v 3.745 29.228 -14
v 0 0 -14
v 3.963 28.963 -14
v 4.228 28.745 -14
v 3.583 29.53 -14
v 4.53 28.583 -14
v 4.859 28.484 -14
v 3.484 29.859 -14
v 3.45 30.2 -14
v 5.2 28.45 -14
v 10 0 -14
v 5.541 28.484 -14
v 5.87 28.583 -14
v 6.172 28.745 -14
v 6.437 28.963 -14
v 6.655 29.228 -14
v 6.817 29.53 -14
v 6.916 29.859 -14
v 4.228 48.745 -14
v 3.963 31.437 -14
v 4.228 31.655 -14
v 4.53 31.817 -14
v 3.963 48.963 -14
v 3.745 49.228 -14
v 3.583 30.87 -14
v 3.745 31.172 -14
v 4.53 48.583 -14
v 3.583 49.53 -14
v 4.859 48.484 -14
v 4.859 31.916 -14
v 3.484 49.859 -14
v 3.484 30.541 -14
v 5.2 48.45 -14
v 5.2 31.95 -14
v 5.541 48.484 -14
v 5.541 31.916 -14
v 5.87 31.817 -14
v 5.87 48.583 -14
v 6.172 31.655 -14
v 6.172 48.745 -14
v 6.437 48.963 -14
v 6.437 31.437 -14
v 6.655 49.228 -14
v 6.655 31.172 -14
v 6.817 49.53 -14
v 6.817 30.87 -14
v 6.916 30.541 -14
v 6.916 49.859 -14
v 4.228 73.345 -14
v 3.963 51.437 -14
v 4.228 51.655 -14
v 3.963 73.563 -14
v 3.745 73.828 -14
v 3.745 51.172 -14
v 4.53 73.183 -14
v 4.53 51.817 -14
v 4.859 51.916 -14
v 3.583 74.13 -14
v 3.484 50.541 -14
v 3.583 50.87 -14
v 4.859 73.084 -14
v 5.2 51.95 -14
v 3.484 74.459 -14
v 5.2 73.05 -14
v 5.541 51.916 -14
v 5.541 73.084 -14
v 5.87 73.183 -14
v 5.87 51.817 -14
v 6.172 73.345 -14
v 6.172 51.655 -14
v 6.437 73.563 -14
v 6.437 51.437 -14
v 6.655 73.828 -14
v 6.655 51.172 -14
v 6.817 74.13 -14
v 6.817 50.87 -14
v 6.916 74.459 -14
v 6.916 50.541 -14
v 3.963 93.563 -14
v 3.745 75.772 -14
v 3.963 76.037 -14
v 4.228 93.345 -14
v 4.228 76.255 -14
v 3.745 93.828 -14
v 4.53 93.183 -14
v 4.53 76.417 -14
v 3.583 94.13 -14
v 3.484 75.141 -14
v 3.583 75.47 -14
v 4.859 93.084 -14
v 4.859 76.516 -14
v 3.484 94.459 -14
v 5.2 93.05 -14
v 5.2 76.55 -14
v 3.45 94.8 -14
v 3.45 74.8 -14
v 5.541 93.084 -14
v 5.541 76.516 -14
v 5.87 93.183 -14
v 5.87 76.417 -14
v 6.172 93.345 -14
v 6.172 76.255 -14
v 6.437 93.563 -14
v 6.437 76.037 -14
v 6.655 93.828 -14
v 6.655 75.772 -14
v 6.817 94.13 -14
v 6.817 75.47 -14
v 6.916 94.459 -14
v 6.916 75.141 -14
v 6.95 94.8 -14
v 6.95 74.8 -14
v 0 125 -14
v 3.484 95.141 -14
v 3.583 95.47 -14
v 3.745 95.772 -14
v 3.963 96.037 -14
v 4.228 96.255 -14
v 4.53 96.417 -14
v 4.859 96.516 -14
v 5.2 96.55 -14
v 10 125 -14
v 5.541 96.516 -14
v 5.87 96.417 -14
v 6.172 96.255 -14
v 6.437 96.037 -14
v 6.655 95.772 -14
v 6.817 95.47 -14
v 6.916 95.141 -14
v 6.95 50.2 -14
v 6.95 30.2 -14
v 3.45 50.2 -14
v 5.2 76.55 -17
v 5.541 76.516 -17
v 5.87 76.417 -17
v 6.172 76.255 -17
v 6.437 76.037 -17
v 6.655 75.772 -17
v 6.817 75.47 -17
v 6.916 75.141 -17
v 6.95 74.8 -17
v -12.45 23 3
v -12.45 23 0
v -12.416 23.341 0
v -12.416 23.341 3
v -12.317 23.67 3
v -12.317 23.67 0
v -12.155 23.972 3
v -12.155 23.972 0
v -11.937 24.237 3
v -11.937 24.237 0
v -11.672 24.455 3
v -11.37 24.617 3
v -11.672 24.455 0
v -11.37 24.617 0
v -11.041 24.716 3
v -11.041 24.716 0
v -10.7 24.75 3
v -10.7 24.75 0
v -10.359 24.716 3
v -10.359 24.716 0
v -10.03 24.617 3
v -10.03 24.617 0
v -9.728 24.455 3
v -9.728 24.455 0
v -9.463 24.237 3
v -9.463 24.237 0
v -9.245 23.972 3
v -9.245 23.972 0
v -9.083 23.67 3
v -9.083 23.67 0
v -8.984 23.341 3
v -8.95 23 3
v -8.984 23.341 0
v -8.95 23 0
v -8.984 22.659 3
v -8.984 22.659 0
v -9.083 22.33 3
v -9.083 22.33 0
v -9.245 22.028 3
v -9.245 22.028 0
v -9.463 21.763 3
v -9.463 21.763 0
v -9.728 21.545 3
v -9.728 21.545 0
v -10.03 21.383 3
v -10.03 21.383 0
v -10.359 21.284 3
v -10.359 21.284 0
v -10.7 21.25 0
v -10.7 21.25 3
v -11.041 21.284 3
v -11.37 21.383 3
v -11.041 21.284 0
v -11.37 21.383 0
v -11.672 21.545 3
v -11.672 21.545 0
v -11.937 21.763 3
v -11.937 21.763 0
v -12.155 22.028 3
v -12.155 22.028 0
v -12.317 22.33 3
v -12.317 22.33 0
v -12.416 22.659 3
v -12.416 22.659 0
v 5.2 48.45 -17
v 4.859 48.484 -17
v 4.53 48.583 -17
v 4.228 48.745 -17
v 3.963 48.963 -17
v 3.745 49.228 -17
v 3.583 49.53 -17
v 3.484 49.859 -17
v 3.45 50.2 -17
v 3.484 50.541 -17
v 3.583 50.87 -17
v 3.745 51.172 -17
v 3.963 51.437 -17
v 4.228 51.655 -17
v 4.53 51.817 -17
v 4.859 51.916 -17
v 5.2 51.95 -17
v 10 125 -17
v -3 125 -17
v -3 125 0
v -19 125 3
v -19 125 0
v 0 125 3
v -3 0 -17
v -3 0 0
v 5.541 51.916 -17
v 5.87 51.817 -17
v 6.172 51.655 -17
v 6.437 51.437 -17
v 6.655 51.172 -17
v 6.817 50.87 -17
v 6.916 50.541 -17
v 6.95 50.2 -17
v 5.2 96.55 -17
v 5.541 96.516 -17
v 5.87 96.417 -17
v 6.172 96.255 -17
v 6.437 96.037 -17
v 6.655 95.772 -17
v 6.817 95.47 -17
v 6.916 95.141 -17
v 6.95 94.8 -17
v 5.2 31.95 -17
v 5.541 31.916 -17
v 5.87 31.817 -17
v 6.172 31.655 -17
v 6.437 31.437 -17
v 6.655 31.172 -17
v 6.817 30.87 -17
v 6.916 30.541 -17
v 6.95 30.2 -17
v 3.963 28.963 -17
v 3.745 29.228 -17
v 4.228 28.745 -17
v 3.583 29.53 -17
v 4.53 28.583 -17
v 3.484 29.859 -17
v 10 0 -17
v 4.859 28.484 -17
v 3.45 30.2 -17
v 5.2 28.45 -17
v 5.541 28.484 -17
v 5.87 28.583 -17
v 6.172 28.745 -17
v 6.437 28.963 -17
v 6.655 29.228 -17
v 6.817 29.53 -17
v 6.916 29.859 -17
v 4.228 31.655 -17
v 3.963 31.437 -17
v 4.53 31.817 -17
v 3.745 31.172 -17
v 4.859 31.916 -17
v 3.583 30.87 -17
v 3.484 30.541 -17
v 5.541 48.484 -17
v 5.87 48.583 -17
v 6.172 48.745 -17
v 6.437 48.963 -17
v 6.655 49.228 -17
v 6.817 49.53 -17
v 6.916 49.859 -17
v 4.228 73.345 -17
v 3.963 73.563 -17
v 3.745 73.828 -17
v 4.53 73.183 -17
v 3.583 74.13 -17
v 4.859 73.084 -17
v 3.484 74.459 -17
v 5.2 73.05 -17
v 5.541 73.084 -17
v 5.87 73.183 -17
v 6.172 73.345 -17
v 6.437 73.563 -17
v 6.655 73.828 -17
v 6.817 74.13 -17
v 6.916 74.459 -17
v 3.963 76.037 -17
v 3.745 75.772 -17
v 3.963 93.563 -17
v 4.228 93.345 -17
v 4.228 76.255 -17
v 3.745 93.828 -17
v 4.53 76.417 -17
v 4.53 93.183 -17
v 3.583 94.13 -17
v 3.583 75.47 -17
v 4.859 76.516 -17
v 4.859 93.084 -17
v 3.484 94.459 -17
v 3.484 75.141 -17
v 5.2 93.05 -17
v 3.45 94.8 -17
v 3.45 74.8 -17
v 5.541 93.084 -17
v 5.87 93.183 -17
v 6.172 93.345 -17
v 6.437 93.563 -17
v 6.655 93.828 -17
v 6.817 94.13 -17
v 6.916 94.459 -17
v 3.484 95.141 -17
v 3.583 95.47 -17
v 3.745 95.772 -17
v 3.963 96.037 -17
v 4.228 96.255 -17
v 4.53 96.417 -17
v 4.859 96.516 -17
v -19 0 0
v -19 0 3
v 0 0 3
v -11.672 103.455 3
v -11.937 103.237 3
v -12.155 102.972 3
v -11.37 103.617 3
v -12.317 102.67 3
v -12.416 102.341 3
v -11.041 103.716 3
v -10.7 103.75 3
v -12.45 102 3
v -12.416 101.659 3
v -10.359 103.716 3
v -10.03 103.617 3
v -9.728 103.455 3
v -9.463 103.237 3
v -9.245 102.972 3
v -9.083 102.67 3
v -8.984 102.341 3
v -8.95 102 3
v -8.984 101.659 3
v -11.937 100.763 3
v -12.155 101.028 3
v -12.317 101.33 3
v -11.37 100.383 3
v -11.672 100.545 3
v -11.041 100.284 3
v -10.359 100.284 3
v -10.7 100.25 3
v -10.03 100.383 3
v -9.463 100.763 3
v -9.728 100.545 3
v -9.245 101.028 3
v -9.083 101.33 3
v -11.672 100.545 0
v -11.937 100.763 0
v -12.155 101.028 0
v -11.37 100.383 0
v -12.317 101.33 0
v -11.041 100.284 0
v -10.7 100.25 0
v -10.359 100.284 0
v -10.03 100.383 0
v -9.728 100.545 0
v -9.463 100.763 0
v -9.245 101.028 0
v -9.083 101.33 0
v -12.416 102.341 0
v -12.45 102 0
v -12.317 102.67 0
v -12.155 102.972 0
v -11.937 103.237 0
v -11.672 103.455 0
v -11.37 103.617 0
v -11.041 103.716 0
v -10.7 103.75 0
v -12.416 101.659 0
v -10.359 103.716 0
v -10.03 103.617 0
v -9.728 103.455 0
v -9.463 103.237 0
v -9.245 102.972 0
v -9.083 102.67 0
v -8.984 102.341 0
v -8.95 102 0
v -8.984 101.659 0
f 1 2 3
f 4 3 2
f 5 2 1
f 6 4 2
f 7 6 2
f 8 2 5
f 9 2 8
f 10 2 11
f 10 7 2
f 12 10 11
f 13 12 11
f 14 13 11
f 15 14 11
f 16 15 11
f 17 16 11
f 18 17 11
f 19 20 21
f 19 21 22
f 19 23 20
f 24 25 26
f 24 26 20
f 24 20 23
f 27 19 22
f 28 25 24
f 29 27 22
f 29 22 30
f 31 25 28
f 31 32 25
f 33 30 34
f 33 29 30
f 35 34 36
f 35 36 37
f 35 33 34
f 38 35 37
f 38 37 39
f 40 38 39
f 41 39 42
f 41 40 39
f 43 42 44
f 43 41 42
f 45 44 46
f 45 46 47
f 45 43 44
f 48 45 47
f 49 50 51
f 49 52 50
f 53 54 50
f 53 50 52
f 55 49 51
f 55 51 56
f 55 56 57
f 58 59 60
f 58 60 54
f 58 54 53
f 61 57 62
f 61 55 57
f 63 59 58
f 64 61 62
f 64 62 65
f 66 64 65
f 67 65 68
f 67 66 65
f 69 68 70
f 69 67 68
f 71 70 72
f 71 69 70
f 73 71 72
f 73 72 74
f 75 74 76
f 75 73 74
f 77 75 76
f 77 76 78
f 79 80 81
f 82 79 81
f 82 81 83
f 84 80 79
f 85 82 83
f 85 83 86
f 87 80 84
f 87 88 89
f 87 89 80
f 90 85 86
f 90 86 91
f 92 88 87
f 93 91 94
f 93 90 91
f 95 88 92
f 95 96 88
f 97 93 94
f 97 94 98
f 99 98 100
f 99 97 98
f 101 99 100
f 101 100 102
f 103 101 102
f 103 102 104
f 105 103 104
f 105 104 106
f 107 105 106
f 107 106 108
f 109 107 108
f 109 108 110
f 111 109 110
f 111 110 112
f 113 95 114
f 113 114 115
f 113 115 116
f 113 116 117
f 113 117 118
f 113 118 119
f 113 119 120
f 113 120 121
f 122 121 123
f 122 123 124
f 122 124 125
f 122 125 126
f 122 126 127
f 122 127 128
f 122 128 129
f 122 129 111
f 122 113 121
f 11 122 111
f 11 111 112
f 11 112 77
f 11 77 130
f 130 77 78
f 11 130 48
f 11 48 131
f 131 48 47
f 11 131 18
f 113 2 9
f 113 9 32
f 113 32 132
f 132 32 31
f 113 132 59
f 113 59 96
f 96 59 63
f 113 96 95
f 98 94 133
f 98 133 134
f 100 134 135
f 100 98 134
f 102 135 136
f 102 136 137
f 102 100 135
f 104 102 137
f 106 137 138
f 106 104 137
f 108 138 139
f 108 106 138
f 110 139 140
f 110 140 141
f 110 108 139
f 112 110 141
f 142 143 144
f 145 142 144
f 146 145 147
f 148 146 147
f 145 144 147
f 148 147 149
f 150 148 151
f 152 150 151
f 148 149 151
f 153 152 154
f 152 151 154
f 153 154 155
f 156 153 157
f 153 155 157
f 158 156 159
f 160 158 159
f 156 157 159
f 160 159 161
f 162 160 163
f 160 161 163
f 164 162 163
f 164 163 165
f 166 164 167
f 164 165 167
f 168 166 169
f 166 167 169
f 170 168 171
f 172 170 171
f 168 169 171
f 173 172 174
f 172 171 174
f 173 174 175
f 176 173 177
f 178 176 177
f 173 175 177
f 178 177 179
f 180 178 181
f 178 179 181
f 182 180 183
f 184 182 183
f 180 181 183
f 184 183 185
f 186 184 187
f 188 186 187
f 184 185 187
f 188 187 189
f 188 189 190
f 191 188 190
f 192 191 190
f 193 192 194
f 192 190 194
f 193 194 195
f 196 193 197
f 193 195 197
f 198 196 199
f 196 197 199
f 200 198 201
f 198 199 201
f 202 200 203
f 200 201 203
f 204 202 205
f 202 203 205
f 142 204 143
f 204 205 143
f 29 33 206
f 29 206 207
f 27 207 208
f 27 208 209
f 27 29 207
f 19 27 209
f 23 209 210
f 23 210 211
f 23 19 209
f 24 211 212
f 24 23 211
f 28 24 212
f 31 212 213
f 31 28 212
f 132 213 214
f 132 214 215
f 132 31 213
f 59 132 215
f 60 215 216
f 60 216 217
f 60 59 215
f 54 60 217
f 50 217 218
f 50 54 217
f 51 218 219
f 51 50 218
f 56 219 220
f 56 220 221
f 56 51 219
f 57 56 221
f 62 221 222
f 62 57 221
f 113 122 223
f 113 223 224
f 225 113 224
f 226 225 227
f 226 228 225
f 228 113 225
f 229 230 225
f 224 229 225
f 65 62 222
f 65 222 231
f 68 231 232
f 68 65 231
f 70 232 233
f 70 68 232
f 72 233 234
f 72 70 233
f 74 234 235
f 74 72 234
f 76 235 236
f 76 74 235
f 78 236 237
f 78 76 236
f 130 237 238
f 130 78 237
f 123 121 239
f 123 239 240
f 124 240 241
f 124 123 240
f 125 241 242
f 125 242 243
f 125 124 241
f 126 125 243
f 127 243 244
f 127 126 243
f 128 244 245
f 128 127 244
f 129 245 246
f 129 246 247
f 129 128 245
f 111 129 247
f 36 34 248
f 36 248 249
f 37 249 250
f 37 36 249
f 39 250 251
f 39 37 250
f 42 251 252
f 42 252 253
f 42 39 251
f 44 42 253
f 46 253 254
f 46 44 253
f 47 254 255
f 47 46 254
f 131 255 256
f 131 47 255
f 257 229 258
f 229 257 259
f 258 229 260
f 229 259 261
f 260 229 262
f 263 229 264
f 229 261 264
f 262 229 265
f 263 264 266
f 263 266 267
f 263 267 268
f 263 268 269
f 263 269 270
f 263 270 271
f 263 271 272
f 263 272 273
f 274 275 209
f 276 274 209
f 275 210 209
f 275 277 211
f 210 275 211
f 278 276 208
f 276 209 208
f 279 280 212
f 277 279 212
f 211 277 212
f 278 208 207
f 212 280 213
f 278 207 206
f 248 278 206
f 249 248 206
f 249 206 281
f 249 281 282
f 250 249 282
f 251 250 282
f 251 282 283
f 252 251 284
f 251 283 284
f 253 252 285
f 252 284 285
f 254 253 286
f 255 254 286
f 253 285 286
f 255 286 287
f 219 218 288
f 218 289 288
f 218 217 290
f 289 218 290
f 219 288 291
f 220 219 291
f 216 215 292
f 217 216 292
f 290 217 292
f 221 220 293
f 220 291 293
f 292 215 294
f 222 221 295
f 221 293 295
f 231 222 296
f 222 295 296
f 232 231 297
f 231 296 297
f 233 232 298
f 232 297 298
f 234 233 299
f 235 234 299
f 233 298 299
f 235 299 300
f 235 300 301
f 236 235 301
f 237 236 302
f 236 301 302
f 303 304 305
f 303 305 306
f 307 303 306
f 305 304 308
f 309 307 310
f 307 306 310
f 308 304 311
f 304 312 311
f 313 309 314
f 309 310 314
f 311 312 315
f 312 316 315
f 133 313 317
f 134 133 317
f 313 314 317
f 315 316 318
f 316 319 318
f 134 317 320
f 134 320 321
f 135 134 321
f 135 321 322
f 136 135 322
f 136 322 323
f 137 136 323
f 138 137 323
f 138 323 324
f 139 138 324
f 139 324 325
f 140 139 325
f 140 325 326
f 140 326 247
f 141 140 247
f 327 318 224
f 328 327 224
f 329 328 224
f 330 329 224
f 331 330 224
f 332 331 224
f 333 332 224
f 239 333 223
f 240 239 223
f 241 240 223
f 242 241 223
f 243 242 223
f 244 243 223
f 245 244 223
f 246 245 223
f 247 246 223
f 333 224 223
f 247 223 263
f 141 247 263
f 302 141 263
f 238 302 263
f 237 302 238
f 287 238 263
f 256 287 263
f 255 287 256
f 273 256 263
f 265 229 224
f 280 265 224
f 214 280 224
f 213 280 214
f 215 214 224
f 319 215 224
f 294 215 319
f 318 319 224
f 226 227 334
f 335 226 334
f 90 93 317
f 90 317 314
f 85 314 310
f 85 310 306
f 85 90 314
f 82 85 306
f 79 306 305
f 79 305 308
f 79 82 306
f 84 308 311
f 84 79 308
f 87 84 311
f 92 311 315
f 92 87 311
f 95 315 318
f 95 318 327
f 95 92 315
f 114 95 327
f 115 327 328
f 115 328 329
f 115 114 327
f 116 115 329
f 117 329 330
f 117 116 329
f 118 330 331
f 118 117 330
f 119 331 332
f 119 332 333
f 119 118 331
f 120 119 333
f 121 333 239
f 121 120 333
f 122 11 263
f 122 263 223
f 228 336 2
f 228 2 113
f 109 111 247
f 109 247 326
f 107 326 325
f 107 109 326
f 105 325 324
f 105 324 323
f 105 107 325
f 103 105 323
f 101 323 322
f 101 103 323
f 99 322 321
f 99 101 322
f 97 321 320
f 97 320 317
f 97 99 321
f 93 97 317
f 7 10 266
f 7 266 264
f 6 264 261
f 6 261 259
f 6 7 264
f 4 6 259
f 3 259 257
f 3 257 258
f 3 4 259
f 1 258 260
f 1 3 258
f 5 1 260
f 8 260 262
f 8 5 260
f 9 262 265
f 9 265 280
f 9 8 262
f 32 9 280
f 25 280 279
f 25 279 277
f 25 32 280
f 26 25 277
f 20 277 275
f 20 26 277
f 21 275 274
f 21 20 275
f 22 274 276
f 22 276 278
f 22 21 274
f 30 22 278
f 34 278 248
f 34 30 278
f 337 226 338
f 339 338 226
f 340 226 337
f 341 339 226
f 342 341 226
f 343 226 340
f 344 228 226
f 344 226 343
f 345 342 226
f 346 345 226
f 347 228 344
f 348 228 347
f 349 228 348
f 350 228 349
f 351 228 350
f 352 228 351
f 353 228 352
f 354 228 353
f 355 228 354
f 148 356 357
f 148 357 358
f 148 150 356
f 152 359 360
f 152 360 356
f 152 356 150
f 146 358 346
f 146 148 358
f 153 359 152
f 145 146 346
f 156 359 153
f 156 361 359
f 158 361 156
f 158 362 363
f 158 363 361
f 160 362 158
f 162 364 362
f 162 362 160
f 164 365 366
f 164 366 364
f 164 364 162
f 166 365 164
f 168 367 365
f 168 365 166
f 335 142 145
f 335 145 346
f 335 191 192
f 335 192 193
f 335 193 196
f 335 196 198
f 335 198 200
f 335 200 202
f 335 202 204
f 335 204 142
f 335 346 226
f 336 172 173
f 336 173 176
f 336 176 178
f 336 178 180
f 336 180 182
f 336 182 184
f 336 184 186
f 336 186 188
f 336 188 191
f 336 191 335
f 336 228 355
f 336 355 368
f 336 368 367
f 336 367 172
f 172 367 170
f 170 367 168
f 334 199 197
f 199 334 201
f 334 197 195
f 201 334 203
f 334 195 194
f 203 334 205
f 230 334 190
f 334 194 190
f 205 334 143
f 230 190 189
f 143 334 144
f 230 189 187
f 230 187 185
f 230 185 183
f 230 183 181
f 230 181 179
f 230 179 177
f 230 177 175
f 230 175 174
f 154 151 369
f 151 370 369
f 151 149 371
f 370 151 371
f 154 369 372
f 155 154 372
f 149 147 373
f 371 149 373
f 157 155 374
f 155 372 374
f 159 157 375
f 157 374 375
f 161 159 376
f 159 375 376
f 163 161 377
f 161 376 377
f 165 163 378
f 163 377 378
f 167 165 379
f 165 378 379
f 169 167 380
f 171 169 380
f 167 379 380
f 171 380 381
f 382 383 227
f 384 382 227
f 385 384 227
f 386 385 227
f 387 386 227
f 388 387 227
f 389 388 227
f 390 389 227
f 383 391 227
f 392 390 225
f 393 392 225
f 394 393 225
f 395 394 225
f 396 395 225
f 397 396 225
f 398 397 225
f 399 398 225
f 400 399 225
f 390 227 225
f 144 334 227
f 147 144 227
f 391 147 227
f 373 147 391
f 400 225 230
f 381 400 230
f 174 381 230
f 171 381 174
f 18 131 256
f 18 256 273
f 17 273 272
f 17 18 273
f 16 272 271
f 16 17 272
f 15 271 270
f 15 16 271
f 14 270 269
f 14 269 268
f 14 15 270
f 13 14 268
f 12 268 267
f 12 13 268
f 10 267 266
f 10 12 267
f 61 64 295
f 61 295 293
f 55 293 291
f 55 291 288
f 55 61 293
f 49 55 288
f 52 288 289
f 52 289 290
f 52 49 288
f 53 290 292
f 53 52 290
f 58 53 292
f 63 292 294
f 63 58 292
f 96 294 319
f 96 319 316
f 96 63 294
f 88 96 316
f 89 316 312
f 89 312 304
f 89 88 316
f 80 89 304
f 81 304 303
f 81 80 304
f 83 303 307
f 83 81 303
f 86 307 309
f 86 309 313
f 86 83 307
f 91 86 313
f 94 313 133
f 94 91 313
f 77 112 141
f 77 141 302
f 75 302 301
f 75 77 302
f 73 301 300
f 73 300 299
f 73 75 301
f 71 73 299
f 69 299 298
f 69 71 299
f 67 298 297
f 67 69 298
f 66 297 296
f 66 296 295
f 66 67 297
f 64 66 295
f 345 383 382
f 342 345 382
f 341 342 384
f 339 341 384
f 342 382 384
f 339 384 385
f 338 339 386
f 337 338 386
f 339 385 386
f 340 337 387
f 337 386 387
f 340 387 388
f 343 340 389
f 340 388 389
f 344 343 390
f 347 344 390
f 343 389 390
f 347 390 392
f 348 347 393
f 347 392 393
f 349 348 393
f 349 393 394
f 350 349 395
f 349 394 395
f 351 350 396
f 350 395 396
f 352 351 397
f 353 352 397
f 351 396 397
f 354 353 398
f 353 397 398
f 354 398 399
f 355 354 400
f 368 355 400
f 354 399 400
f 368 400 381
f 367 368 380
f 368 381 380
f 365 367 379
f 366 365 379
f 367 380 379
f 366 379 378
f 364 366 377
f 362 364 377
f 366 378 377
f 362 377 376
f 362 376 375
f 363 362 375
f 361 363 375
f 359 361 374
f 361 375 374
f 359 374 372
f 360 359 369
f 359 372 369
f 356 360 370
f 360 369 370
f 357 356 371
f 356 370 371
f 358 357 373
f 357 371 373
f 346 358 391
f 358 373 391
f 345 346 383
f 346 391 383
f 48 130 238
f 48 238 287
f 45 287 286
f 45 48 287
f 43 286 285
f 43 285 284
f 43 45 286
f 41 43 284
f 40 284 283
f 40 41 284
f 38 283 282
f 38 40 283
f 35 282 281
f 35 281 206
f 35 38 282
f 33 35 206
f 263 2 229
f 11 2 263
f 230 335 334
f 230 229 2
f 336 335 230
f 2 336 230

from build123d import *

# Parameters (mm, degrees)
F3_DEPTH = 3
F4_DEPTH = 3
F0_W     = 1
F0_H     = 3
F5_DEPTH = 125
F7_DEPTH = 3


with BuildPart() as f3:
    # F1 (on Top) → F3 (new body)
    with BuildSketch(Plane.XY):
        Polygon((-19, 0), (-2.7684667148, 0), (-2.7684667148, 125), (-19, 125), (-19, 102), (-19, 23), align=None)
        with BuildLine():
            ThreePointArc((-8.95, 23), (-10.7, 21.25), (-12.45, 23))
            ThreePointArc((-12.45, 23), (-10.7, 24.75), (-8.95, 23))
        make_face(mode=Mode.SUBTRACT)
        with BuildLine():
            ThreePointArc((-8.95, 102), (-10.7, 100.25), (-12.45, 102))
            ThreePointArc((-12.45, 102), (-10.7, 103.75), (-8.95, 102))
        make_face(mode=Mode.SUBTRACT)
    extrude(amount=F3_DEPTH)

    # F2 (on Right) → F4 (join)
    with BuildSketch(Plane.YZ):
        Polygon((0, 3), (0, 0), (0, -17), (125, -17), (125, 3), align=None)
    extrude(amount=-F4_DEPTH)

    # F0 (on Front) → F5 (join)
    with BuildSketch(Plane.XZ):
        with Locations((0.5, -15.5)):
            Rectangle(F0_W, F0_H)
    extrude(amount=-F5_DEPTH)

    # F6 (on face) → F7 (join)
    with BuildSketch(Plane.XY.offset(-14)):
        with BuildLine():
            Line((1, 125), (1, 0))
            Line((1, 0), (5.2, 0))
            Line((5.2, 0), (5.2, 28.45))
            ThreePointArc((5.2, 28.45), (3.45, 30.2), (5.2, 31.95))
            Line((5.2, 31.95), (5.2, 48.45))
            ThreePointArc((5.2, 48.45), (3.45, 50.2), (5.2, 51.95))
            Line((5.2, 51.95), (5.2, 73.05))
            ThreePointArc((5.2, 73.05), (3.45, 74.8), (5.2, 76.55))
            Line((5.2, 76.55), (5.2, 93.05))
            ThreePointArc((5.2, 93.05), (3.45, 94.8), (5.2, 96.55))
            Line((5.2, 96.55), (5.2, 125))
            Line((5.2, 125), (1, 125))
        make_face()
        with BuildLine():
            Line((5.2, 28.45), (5.2, 0))
            Line((5.2, 0), (10, 0))
            Line((10, 0), (10, 125))
            Line((10, 125), (6.2, 125))
            Line((6.2, 125), (5.2, 125))
            Line((5.2, 125), (5.2, 96.55))
            ThreePointArc((5.2, 96.55), (6.4374368671, 96.0374368671), (6.95, 94.8))
            ThreePointArc((6.95, 94.8), (6.4374368671, 93.5625631329), (5.2, 93.05))
            Line((5.2, 93.05), (5.2, 76.55))
            ThreePointArc((5.2, 76.55), (6.4374368671, 76.0374368671), (6.95, 74.8))
            ThreePointArc((6.95, 74.8), (6.4374368671, 73.5625631329), (5.2, 73.05))
            Line((5.2, 73.05), (5.2, 51.95))
            ThreePointArc((5.2, 51.95), (6.4374368671, 51.4374368671), (6.95, 50.2))
            ThreePointArc((6.95, 50.2), (6.4374368671, 48.9625631329), (5.2, 48.45))
            Line((5.2, 48.45), (5.2, 31.95))
            ThreePointArc((5.2, 31.95), (6.4374368671, 31.4374368671), (6.95, 30.2))
            ThreePointArc((6.95, 30.2), (6.4374368671, 28.9625631329), (5.2, 28.45))
        make_face()
    extrude(amount=-F7_DEPTH)


solid = f3.part
